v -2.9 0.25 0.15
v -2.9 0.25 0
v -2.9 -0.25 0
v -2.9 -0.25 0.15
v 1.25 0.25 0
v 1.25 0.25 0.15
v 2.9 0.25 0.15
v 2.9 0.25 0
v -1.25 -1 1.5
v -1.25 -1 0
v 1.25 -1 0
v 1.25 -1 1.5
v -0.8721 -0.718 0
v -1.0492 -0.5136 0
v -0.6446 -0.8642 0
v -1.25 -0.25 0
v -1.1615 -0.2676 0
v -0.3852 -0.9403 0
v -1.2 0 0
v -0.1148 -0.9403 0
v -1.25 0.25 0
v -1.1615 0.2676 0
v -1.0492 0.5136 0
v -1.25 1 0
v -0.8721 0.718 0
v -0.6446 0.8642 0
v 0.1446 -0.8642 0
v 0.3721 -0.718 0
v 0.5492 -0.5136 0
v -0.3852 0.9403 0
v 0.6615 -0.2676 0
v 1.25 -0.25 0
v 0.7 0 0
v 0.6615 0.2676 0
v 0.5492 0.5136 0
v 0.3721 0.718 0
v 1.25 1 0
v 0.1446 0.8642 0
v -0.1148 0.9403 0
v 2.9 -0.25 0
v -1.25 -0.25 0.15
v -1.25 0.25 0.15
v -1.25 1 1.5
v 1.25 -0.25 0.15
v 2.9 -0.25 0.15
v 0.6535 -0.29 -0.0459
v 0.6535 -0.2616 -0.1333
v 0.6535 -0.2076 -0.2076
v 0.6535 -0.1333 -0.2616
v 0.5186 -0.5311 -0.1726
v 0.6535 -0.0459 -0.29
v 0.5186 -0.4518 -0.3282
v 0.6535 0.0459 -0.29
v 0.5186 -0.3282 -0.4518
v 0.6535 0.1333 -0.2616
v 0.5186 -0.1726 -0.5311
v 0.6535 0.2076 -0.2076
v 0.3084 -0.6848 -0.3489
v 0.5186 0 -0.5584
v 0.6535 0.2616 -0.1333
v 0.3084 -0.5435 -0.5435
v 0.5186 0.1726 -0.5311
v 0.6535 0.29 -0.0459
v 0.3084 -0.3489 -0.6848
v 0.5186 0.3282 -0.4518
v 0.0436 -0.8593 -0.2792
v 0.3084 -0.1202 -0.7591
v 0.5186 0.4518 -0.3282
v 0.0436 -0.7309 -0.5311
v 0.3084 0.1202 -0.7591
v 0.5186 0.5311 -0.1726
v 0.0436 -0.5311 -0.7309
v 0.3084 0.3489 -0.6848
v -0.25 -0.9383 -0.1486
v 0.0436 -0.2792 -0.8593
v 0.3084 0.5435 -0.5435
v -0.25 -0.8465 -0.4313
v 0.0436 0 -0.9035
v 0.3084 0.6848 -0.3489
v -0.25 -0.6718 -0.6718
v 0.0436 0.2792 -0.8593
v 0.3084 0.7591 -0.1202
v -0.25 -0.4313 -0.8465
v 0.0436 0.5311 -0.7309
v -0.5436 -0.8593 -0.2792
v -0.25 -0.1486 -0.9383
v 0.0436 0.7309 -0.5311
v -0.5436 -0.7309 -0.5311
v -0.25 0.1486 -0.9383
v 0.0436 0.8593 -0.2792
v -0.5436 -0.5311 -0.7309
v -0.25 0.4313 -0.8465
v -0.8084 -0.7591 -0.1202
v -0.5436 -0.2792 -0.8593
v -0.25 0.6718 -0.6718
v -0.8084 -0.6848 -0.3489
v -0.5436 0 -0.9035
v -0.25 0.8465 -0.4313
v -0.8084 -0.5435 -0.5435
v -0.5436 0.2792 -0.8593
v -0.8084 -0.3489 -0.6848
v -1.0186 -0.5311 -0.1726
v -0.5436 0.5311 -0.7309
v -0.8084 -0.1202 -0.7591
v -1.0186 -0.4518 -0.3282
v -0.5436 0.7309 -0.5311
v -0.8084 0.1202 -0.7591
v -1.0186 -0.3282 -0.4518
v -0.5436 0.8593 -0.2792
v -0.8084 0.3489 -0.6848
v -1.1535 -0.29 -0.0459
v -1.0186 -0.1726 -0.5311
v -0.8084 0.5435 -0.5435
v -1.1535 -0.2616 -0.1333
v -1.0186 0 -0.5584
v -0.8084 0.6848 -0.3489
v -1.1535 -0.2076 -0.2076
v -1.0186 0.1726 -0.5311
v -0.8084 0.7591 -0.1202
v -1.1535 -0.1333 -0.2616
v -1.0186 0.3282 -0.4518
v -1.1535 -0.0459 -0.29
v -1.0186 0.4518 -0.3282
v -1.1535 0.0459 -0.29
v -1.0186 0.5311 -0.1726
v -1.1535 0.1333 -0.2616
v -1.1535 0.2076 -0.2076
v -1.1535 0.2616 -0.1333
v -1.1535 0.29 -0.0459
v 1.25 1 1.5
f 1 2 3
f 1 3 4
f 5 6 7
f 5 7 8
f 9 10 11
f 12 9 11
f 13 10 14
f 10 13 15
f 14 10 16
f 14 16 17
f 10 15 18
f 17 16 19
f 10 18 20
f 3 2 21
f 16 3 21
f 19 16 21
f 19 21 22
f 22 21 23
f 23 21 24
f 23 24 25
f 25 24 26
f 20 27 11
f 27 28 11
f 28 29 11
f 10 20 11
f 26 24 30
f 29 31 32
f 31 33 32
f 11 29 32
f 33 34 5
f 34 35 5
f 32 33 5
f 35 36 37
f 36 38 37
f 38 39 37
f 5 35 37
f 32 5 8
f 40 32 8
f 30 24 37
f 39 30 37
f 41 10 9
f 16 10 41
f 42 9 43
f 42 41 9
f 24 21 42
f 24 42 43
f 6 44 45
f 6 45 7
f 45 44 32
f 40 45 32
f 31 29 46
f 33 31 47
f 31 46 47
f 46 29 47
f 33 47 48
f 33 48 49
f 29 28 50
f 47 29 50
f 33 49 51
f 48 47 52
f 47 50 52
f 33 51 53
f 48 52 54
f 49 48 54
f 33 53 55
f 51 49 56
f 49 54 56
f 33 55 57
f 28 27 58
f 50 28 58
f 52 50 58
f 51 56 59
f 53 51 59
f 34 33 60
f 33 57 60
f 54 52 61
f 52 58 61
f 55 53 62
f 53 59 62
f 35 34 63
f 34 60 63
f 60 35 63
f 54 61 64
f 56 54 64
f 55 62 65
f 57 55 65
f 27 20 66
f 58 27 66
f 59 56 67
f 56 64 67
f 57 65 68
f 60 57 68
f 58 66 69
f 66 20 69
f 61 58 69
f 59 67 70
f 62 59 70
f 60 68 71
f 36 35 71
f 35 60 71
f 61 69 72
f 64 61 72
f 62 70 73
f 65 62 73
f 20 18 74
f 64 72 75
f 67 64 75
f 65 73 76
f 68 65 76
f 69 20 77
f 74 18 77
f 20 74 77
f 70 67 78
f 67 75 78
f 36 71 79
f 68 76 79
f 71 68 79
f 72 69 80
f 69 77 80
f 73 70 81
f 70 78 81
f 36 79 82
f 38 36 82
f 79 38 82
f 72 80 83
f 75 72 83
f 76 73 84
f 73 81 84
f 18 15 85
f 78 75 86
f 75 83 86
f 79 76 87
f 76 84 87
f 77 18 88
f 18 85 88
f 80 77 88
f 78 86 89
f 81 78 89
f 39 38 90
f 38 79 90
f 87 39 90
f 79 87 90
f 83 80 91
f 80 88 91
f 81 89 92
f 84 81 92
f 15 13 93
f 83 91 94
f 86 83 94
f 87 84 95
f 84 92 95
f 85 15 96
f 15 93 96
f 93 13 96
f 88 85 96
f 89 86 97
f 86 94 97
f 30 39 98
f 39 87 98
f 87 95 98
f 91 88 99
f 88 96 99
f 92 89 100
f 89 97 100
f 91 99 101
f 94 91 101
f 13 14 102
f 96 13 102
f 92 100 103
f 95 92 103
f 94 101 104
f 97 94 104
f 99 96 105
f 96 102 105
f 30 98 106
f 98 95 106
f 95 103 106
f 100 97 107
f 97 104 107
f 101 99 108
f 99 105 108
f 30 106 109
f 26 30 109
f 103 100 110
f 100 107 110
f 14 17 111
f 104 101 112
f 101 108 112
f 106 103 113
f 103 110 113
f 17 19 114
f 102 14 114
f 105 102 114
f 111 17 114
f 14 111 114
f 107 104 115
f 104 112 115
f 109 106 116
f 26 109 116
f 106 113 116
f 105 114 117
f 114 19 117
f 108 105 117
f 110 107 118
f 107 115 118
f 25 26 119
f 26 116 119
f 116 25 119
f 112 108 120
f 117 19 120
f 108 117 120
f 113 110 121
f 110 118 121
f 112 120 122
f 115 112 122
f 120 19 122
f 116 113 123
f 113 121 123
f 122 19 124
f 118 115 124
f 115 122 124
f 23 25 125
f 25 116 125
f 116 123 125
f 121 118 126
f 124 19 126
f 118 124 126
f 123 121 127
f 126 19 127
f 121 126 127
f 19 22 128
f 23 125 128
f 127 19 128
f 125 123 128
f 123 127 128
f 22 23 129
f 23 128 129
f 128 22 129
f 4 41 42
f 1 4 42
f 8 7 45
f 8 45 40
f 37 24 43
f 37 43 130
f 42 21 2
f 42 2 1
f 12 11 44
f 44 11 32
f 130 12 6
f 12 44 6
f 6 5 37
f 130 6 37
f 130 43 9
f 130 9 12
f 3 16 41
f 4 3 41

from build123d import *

# Parameters (mm, degrees)
SKETCH_1_W      = 2.5
SKETCH_1_H      = 2
EXTRUDE_1_DEPTH = 1.5
SKETCH_2_W      = 0.15
SKETCH_2_H      = 0.5
EXTRUDE_2_DEPTH = 1.65
SKETCH_3_W      = 0.15
SKETCH_3_H      = 0.5
EXTRUDE_3_DEPTH = 1.65


with BuildPart() as part:
    # Эскиз1 → Бобышка-Вытянуть1 (new body)
    with BuildSketch(Plane.XY):
        Rectangle(SKETCH_1_W, SKETCH_1_H)
    extrude(amount=EXTRUDE_1_DEPTH)

    # Эскиз2 → Бобышка-Вытянуть2 (add)
    with BuildSketch(Plane(origin=(1.25, 0, 0), x_dir=(0, 0, -1), z_dir=(1, 0, 0))):
        with Locations((-0.075, 0)):
            Rectangle(SKETCH_2_W, SKETCH_2_H)
    extrude(amount=EXTRUDE_2_DEPTH)

    # Эскиз3 → Бобышка-Вытянуть3 (add)
    with BuildSketch(Plane.ZY.offset(1.25)):
        with Locations((0.075, 0)):
            Rectangle(SKETCH_3_W, SKETCH_3_H)
    extrude(amount=EXTRUDE_3_DEPTH)

    # Эскиз4 → Повернуть1 (revolve)
    with BuildSketch(Plane(origin=(0, 0, 0), x_dir=(-1, 0, 0), z_dir=(0, 0, -1))):
        with BuildLine():
            Line((1.2, 0), (-0.7, 0))
            ThreePointArc((-0.7, 0), (0.25, 0.95), (1.2, 0))
        make_face()
    revolve(axis=Axis((-1.2, 0, 0), (1, 0, 0)))


solid = part.part
